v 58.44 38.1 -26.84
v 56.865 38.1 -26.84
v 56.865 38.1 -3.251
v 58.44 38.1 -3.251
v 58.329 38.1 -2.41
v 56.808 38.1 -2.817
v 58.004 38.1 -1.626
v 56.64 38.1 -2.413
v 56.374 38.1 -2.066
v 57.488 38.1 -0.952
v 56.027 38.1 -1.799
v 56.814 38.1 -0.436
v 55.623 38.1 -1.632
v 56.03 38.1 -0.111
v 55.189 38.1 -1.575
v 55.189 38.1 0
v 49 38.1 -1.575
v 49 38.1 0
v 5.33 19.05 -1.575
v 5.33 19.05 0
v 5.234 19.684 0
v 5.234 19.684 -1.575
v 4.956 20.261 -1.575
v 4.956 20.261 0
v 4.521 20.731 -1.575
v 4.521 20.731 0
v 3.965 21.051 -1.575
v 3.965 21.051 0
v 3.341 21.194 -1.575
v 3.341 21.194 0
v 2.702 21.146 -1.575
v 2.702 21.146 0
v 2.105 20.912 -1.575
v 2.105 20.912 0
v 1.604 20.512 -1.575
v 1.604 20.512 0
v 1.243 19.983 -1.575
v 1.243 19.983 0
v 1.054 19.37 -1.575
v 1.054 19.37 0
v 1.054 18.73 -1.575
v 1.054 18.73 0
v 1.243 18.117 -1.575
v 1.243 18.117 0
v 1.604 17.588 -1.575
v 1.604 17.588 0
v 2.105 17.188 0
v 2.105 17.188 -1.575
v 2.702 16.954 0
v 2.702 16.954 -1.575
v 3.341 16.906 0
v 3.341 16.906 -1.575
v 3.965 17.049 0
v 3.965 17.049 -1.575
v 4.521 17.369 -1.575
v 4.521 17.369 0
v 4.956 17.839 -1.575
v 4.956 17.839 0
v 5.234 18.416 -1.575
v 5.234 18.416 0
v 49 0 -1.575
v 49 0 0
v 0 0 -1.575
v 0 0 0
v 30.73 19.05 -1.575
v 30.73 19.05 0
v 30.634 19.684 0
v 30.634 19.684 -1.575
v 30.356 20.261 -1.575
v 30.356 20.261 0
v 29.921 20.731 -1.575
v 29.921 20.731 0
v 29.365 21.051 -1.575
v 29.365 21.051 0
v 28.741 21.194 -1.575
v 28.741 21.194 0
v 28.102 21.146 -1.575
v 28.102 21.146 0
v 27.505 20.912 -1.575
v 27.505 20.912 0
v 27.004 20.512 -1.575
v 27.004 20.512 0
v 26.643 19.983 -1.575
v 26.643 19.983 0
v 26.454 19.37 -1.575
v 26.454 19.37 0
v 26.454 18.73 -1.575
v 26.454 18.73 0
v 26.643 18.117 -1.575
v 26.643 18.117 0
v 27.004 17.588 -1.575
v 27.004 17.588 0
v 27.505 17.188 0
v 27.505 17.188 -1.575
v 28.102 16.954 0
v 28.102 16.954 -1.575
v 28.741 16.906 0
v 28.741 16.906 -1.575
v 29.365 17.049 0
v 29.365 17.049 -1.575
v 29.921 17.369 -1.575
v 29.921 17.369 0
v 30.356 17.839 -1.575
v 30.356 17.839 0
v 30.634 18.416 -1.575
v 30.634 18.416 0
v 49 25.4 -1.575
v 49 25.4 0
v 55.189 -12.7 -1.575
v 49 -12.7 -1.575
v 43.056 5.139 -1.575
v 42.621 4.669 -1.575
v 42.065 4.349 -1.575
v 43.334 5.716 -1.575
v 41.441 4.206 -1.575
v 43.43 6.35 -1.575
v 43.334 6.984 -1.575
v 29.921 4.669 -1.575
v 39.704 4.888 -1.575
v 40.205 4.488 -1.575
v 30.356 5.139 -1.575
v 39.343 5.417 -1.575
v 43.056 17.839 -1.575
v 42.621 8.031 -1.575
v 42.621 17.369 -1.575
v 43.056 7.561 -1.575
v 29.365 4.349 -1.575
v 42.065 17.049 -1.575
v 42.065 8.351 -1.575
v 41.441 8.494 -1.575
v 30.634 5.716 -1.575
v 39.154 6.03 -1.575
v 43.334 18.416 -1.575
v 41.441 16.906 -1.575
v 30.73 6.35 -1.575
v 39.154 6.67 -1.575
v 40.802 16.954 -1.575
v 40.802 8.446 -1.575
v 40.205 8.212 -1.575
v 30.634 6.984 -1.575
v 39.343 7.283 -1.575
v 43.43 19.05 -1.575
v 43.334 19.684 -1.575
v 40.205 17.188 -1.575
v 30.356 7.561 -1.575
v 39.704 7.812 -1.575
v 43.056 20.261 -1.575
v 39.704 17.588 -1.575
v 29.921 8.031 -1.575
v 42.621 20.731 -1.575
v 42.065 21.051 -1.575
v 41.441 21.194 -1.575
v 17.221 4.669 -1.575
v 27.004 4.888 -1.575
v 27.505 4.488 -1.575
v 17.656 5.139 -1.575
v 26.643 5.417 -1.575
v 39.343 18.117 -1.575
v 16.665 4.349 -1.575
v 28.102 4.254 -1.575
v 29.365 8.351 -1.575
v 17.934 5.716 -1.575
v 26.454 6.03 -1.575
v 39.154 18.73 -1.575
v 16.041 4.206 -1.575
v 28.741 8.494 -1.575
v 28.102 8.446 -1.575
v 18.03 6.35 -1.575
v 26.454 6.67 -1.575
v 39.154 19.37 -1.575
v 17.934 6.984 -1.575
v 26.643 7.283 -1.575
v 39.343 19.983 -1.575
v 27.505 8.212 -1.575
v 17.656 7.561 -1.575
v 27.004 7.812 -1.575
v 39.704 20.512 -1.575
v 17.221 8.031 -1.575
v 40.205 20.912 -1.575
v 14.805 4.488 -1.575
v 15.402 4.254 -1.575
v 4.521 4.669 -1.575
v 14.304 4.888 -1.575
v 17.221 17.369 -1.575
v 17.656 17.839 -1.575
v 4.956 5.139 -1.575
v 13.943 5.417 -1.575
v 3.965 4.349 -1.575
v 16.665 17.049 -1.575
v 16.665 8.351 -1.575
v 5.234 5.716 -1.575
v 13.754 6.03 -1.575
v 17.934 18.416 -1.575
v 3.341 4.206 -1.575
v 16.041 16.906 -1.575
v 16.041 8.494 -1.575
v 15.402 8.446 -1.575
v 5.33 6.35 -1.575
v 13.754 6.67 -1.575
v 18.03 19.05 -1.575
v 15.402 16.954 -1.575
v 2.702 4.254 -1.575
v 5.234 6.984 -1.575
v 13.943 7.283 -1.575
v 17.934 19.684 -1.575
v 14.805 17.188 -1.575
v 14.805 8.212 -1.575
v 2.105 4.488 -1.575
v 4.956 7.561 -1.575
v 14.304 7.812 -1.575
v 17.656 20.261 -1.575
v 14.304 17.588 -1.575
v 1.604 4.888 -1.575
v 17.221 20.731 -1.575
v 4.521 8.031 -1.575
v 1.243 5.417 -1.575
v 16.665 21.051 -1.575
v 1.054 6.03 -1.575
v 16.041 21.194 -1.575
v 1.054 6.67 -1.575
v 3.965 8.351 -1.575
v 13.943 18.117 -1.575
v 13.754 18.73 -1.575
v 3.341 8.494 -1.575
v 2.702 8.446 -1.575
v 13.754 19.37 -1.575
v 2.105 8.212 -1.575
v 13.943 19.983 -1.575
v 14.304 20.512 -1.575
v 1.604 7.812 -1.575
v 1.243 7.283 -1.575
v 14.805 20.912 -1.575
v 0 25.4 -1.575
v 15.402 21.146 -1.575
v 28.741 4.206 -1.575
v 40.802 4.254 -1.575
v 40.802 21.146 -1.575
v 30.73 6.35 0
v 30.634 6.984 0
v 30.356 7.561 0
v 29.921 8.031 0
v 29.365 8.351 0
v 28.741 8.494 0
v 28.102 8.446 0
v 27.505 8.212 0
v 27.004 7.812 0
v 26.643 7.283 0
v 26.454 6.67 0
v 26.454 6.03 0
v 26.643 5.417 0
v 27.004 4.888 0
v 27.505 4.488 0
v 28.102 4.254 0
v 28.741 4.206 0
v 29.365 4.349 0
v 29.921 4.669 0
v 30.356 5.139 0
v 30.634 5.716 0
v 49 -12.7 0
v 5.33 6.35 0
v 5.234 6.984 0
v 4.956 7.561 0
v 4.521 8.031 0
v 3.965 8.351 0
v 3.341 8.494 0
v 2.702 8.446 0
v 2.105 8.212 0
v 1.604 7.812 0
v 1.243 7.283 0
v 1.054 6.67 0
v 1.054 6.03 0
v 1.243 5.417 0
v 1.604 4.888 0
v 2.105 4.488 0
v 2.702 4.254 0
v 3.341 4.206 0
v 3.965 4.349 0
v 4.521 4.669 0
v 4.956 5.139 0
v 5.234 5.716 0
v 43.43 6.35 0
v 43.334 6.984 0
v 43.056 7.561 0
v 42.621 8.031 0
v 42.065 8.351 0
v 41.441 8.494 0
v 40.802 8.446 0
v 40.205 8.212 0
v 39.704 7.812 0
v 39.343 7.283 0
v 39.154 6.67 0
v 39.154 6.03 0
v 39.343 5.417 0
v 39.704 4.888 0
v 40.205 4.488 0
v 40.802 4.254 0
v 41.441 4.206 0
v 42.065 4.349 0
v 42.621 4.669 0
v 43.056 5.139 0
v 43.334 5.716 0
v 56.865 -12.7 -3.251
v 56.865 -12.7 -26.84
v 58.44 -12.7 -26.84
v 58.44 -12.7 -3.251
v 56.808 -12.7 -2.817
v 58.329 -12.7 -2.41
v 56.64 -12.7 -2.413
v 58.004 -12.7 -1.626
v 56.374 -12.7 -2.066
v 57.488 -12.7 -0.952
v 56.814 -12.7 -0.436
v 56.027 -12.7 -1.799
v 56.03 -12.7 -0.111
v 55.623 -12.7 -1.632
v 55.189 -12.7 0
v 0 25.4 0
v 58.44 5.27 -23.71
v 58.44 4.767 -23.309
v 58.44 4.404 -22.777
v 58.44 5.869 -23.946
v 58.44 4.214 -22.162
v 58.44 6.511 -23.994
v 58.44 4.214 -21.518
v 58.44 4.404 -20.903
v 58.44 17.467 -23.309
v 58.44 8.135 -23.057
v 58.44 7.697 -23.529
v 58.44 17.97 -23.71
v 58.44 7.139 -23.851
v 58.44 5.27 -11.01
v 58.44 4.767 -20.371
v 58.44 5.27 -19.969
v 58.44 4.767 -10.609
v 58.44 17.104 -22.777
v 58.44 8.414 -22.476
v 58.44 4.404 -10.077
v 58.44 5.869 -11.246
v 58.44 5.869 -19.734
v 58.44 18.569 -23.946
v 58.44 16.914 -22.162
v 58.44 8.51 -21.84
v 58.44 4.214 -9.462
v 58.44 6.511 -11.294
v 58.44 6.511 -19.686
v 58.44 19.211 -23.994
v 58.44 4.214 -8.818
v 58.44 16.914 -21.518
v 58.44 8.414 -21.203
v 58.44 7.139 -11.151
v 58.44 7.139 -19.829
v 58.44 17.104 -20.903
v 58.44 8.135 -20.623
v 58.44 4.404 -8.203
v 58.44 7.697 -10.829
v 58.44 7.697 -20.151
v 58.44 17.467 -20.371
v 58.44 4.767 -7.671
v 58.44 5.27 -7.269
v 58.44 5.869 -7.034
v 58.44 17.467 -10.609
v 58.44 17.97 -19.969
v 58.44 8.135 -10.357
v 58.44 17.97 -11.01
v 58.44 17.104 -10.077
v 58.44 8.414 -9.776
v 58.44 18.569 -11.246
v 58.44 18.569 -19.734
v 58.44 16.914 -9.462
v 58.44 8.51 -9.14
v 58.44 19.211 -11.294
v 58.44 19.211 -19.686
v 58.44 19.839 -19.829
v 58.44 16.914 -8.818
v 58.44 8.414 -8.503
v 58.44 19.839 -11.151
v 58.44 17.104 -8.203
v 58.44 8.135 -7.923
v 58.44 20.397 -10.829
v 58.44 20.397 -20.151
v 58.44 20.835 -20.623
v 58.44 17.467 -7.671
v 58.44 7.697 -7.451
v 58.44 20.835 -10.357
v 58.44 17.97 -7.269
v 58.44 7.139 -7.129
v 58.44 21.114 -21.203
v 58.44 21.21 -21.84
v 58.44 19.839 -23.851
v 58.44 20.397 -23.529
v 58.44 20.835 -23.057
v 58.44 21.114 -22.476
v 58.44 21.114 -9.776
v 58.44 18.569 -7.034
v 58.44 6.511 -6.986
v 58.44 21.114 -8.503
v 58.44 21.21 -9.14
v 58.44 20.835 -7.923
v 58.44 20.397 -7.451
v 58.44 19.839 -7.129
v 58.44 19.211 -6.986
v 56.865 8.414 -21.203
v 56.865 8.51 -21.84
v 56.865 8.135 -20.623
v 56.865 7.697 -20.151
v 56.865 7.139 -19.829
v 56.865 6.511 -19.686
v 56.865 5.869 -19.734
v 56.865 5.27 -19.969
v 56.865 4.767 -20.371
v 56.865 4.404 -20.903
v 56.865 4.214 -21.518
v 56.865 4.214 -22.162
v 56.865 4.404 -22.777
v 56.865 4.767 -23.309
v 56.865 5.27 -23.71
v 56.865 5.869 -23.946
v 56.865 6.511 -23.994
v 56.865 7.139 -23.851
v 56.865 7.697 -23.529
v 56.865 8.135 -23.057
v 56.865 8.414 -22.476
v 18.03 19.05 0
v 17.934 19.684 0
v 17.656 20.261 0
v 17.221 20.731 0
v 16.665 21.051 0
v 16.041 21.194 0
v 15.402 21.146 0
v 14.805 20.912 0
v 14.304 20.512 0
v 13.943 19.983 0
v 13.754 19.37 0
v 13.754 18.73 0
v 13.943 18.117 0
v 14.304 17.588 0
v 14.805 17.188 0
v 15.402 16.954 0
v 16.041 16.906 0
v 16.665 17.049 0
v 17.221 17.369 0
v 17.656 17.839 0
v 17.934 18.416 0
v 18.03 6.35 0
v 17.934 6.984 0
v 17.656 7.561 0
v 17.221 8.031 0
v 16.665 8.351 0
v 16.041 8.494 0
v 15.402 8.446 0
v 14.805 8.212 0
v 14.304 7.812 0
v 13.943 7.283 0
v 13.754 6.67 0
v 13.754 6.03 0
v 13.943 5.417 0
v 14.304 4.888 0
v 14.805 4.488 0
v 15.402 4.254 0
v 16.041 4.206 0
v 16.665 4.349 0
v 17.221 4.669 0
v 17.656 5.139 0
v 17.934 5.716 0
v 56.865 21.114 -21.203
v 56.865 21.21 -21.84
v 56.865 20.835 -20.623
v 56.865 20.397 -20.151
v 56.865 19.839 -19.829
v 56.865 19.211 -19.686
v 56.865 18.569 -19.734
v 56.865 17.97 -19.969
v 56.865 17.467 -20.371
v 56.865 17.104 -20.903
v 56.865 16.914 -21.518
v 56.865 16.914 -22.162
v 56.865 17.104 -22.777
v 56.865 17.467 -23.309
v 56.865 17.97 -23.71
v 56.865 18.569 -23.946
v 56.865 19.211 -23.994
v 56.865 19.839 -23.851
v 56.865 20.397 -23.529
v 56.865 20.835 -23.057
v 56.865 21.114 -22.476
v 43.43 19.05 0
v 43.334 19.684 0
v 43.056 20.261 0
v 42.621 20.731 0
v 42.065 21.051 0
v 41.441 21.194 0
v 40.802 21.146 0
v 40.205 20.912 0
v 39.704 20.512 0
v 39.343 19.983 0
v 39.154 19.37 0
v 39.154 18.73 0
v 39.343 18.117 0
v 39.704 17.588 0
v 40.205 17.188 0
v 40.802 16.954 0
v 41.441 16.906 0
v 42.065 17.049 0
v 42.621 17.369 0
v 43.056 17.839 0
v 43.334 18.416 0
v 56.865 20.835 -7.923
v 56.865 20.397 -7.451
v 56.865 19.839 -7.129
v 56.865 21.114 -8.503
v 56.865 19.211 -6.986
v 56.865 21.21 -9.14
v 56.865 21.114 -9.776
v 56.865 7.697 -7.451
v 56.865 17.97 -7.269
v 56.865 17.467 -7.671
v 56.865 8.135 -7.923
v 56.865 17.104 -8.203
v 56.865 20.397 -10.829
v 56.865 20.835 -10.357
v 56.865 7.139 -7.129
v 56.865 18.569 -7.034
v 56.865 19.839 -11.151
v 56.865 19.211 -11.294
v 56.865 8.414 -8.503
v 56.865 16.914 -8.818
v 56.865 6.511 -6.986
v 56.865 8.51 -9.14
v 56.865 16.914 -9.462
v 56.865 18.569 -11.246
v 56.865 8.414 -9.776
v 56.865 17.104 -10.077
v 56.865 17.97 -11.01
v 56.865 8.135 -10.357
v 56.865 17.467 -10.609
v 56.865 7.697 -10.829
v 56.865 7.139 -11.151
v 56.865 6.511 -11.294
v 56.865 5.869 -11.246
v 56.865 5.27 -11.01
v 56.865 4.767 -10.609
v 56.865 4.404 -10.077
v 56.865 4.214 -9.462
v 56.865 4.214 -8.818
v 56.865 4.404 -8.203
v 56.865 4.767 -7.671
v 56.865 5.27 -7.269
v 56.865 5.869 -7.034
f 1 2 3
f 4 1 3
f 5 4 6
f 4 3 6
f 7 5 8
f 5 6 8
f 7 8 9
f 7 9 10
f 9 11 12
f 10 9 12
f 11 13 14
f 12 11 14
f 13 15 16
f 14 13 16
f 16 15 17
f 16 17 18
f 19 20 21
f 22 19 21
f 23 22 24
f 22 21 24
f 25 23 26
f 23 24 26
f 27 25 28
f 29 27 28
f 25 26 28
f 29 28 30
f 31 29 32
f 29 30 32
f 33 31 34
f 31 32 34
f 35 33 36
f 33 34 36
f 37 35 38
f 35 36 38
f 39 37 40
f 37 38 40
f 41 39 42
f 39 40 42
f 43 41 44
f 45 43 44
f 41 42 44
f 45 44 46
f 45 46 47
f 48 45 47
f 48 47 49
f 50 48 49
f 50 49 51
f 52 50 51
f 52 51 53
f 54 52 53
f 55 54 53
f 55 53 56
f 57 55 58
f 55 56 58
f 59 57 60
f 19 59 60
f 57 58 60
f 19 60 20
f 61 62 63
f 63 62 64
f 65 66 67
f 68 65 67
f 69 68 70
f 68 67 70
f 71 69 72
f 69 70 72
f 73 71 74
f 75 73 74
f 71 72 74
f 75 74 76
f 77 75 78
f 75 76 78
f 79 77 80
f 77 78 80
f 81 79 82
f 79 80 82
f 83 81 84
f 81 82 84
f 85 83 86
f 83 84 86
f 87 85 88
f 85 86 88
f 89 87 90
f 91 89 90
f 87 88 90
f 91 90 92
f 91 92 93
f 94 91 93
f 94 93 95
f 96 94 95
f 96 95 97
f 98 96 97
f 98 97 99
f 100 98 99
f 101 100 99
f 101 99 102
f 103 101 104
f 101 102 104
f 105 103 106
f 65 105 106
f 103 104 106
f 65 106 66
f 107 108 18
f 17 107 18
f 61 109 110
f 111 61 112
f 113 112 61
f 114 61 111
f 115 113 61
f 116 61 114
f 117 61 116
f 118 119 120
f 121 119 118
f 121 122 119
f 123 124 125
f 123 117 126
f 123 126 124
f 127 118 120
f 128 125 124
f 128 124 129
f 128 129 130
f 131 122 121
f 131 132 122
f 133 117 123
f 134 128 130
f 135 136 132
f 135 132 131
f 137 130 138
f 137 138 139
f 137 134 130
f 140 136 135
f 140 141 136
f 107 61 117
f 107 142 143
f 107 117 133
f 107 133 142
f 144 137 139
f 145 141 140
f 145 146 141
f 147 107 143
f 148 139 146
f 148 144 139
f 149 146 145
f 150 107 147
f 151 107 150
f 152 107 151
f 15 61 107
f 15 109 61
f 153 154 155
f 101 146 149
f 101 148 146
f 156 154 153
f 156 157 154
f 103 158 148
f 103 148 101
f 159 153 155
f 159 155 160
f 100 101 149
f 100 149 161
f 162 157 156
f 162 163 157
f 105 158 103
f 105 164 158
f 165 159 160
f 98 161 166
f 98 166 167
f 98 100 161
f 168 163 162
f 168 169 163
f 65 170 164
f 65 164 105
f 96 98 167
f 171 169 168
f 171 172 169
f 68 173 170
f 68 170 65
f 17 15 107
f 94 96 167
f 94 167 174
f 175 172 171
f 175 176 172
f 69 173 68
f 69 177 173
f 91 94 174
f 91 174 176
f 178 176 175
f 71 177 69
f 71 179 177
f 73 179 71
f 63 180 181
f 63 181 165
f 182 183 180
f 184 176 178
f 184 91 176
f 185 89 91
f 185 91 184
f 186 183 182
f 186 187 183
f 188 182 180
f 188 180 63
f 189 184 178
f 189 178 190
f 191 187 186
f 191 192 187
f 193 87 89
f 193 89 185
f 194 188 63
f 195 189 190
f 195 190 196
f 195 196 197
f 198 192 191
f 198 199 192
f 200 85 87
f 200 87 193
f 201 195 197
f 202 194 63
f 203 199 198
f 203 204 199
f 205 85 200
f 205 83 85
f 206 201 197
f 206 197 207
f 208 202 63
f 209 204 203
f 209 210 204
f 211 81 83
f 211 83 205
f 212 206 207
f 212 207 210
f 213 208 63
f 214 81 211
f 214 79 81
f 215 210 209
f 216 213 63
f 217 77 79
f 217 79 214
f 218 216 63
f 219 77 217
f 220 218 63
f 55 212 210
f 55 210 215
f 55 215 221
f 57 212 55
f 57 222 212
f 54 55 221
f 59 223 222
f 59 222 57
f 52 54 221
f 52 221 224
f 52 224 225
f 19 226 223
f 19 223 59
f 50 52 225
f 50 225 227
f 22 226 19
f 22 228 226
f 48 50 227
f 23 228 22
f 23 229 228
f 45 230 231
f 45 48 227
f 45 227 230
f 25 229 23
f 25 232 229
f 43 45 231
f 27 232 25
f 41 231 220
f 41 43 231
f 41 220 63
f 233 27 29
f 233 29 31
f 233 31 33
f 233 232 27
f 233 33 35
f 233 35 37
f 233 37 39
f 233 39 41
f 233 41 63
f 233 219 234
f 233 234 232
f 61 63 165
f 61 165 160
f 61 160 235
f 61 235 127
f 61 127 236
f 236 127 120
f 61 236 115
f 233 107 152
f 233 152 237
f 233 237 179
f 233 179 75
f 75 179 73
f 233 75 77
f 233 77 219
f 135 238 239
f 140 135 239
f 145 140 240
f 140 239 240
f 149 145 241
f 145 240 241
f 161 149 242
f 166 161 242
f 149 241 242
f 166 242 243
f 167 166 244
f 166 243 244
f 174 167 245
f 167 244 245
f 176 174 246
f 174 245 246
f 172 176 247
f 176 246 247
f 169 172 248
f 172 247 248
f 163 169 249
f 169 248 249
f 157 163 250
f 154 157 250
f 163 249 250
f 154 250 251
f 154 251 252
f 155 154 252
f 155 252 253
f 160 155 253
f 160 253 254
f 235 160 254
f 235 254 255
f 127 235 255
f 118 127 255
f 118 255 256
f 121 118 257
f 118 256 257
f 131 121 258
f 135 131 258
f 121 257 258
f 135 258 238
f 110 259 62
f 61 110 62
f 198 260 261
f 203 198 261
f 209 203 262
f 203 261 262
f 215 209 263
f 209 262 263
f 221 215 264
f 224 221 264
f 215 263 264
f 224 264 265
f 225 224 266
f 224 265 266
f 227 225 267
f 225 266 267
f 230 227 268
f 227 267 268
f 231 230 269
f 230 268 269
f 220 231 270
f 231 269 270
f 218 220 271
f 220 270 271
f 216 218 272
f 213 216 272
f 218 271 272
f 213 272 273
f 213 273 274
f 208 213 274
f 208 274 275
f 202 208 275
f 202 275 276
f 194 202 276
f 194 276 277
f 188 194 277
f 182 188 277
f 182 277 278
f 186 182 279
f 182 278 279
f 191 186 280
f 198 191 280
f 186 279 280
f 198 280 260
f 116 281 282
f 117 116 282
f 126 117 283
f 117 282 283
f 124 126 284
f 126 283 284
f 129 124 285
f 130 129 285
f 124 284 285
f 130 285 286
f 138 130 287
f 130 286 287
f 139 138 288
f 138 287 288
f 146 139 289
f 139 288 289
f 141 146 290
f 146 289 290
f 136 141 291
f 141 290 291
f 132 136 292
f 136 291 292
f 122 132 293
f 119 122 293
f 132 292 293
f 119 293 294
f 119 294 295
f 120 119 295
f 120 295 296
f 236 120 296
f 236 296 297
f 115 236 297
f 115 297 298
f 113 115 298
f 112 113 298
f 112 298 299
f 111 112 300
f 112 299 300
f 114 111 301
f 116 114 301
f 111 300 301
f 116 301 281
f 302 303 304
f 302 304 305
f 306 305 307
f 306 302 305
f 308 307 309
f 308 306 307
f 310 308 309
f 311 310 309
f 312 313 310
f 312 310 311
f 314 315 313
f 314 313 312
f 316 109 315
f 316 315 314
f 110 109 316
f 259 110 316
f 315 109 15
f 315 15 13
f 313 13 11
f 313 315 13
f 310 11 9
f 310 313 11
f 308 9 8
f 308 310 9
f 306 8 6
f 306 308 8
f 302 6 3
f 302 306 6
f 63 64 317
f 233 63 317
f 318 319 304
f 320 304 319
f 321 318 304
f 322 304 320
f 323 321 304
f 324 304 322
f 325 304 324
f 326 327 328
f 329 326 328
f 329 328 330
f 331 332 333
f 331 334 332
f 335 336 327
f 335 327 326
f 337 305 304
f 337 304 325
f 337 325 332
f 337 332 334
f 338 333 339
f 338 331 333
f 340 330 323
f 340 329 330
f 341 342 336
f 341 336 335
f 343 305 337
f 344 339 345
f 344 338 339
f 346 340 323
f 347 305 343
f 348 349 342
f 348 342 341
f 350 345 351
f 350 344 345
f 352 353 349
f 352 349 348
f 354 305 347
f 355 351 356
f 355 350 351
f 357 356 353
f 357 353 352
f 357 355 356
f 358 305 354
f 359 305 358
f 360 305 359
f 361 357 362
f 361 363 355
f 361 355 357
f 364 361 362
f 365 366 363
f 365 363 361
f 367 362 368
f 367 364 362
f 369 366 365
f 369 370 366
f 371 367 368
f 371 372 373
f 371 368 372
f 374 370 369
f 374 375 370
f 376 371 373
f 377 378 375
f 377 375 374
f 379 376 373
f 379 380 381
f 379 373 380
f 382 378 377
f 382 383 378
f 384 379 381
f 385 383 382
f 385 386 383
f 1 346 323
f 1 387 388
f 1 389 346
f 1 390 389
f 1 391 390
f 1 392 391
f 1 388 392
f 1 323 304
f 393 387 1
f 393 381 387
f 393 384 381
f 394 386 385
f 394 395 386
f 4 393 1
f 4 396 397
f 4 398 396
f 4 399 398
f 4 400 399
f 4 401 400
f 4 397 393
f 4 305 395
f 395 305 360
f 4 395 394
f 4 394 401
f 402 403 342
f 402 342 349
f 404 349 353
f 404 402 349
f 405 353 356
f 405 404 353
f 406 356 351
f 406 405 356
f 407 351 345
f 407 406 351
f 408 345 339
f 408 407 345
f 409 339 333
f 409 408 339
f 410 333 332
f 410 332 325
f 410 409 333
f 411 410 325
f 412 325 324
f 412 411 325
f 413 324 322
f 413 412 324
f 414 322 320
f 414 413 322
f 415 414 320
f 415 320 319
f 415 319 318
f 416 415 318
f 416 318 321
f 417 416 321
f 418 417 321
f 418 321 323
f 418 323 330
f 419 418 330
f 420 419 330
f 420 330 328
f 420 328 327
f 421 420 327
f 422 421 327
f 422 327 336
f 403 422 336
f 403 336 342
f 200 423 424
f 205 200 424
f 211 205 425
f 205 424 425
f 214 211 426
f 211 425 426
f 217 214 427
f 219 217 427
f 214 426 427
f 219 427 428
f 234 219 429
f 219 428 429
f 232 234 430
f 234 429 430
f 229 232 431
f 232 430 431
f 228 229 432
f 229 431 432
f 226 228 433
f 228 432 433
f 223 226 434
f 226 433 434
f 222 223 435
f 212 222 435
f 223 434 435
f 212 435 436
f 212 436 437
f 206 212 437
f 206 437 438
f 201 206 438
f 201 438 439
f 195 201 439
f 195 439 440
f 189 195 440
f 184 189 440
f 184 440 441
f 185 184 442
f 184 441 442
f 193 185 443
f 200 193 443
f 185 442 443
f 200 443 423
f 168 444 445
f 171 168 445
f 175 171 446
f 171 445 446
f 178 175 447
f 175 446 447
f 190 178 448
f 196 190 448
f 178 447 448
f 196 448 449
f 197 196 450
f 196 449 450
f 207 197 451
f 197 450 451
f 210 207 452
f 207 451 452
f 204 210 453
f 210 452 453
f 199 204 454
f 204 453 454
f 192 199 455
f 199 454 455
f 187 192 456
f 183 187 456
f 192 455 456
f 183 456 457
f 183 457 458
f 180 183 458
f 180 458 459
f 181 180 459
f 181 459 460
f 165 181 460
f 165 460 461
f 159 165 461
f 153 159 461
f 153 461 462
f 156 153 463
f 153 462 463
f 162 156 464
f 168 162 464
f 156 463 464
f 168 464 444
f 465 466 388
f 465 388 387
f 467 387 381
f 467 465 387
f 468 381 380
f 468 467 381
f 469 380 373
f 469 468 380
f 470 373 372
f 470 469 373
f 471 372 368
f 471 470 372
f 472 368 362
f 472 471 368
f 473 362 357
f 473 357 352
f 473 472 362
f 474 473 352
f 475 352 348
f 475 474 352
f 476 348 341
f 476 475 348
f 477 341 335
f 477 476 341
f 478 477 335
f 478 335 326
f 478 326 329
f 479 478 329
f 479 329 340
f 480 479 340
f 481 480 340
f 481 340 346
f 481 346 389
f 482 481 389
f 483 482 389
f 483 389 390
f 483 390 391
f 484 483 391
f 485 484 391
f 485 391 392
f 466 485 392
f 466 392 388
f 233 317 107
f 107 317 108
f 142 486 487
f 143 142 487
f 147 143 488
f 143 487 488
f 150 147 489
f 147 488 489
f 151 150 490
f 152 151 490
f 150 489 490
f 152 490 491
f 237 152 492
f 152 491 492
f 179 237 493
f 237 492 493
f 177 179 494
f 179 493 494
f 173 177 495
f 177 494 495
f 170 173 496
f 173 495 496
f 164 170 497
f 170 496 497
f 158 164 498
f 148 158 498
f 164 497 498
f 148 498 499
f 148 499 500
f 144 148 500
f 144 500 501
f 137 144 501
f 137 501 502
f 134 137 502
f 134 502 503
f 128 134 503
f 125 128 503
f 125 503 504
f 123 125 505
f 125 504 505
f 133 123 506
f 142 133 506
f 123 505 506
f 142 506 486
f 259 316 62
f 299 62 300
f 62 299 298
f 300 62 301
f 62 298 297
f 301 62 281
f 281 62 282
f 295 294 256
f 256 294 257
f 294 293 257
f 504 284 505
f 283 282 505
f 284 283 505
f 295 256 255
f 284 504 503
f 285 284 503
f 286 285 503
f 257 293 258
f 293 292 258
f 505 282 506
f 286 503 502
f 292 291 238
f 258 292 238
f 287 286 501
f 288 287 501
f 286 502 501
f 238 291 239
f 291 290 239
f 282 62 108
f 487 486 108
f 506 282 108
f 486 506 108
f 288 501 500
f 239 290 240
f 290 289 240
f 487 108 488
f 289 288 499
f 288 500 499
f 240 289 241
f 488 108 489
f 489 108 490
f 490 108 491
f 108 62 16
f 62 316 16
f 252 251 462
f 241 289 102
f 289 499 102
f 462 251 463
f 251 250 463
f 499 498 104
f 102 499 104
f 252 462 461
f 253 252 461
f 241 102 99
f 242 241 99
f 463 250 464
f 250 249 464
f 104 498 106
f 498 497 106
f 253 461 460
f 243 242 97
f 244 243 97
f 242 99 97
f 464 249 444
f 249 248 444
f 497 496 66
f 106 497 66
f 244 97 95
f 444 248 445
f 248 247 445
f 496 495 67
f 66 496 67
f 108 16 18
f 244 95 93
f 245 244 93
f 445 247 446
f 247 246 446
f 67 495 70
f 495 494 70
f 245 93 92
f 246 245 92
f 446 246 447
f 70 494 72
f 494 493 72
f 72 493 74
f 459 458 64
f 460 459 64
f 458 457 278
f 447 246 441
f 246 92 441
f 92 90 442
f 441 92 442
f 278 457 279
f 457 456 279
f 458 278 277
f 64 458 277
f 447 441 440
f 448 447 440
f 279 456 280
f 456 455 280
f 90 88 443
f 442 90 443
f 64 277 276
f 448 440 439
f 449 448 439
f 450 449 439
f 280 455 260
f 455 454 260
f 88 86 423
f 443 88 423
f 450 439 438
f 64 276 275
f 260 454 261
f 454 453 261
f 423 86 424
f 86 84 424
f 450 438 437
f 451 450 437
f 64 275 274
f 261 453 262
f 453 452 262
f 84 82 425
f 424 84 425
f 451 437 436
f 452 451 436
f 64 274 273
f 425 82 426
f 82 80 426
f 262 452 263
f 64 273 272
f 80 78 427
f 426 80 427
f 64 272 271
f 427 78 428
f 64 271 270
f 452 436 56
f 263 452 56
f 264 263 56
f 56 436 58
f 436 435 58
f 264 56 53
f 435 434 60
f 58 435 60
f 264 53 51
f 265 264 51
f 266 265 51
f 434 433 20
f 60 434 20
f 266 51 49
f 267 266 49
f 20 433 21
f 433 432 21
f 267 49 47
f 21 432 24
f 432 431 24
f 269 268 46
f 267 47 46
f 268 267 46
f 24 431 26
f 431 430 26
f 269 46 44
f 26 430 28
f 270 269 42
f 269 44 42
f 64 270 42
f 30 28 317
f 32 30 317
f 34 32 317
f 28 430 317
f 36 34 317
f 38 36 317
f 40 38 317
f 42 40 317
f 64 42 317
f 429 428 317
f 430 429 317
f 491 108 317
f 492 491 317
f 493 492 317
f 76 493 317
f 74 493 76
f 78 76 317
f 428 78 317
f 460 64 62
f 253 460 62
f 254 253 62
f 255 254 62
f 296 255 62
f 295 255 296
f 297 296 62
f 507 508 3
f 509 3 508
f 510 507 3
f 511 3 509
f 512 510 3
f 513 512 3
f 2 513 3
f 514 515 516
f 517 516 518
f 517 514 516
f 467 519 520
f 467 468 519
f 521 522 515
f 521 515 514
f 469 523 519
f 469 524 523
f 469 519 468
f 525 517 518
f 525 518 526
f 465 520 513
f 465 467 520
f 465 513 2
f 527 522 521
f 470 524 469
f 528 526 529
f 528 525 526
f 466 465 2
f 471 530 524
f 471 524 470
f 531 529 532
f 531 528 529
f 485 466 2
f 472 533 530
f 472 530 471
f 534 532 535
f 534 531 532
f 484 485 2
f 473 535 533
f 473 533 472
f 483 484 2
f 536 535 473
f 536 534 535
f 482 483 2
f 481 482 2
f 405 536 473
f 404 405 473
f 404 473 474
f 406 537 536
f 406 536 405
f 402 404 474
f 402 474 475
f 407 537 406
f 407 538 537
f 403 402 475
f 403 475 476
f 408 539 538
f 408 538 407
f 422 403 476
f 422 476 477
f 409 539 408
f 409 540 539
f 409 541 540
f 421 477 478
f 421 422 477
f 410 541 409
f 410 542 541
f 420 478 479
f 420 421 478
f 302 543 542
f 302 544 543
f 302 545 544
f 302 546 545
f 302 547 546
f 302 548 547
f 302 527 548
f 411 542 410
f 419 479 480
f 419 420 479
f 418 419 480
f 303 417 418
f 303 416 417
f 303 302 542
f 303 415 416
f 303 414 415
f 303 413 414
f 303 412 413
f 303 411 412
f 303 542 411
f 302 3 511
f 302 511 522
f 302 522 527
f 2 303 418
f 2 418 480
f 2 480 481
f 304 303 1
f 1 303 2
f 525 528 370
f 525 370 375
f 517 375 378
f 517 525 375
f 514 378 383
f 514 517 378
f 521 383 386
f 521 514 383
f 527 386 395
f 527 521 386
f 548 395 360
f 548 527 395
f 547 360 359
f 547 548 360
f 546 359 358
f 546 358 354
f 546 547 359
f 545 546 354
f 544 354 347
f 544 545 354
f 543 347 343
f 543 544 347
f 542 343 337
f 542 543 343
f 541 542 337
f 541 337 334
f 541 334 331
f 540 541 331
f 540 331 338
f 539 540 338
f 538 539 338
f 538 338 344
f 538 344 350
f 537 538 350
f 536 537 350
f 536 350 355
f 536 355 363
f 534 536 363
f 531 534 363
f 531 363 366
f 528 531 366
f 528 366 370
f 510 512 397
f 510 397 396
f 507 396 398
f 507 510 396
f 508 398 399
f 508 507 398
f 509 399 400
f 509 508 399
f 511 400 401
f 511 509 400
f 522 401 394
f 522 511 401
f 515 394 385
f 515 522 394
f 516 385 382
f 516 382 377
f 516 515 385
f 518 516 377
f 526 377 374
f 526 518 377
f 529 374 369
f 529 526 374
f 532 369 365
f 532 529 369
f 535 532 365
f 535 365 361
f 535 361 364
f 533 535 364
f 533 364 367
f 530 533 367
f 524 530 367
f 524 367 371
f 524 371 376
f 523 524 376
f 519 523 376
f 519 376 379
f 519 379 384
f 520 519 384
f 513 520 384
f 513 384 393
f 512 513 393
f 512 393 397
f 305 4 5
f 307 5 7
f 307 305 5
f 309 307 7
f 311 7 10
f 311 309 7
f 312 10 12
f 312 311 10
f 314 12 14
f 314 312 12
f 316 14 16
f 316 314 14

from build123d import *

# Parameters (mm, degrees)
SKETCH1_R                  = 2.15
SKETCH1_R_2                = 2.16
BASE_FLANGE1_DEPTH         = 1.5748
SKETCHED_START             = 58.096428764
SKETCHED_BEND1_OUTLINE_W   = 50.8
SKETCHED_BEND1_OUTLINE_H   = 1.5748
SKETCHED_BEND1_DEPTH       = 24.303571236
SKETCHED_START_2           = 56.865020508
SKETCHED_BEND1_2_OUTLINE_W = 50.8
SKETCHED_BEND1_2_OUTLINE_H = 25.265020508
SKETCHED_BEND1_2_OUTLINE_R = 2.16
SKETCHED_BEND1_2_DEPTH     = 0.589203492
SKETCHED_START_3           = 55.188620508
SKETCHED_BEND1_3_OUTLINE_W = 50.8
SKETCHED_BEND1_3_OUTLINE_H = 25.265020508
SKETCHED_BEND1_3_OUTLINE_R = 2.16
SKETCHED_BEND1_3_DEPTH     = 3.2512
SKETCHED_START_4           = -12.7
SKETCHED_BEND1_4_DEPTH     = 50.8


with BuildPart() as part:
    # Base-Flange1: sheet metal written as solids
    # Sketch1 → Base-Flange1 (new body)
    with BuildSketch(Plane.XY):
        Polygon((49, 25.4), (49, 38.1), (57, 38.1), (82.4, 38.1), (82.4, -12.7), (57, -12.7), (49, -12.7), (49, 0), (0, 0), (0, 25.4), align=None)
        with Locations((3.18, 19.05)):
            Circle(SKETCH1_R, mode=Mode.SUBTRACT)
        with Locations((15.88, 19.05)):
            Circle(SKETCH1_R, mode=Mode.SUBTRACT)
        with Locations((28.58, 19.05)):
            Circle(SKETCH1_R, mode=Mode.SUBTRACT)
        with Locations((15.88, 6.35)):
            Circle(SKETCH1_R, mode=Mode.SUBTRACT)
        with Locations((28.58, 6.35)):
            Circle(SKETCH1_R, mode=Mode.SUBTRACT)
        with Locations((3.18, 6.35)):
            Circle(SKETCH1_R, mode=Mode.SUBTRACT)
        with Locations((41.28, 19.05)):
            Circle(SKETCH1_R, mode=Mode.SUBTRACT)
        with Locations((41.28, 6.35)):
            Circle(SKETCH1_R, mode=Mode.SUBTRACT)
        with Locations((64.7, 19.05)):
            Circle(SKETCH1_R_2, mode=Mode.SUBTRACT)
        with Locations((77.4, 19.05)):
            Circle(SKETCH1_R_2, mode=Mode.SUBTRACT)
        with Locations((64.7, 6.35)):
            Circle(SKETCH1_R_2, mode=Mode.SUBTRACT)
        with Locations((77.4, 6.35)):
            Circle(SKETCH1_R_2, mode=Mode.SUBTRACT)
    extrude(amount=-BASE_FLANGE1_DEPTH)

    # Sketched Bend1: read off the stored shape, not the designer's step
    # Sketched Bend1 outline → Sketched Bend1 (cut)
    with BuildSketch(Plane.YZ.offset(SKETCHED_START)):
        with Locations((12.7, -0.7874)):
            Rectangle(SKETCHED_BEND1_OUTLINE_W, SKETCHED_BEND1_OUTLINE_H)
    extrude(amount=SKETCHED_BEND1_DEPTH, mode=Mode.SUBTRACT)

    # Sketched Bend1 2 outline → Sketched Bend1 2 (add)
    with BuildSketch(Plane.YZ.offset(SKETCHED_START_2)):
        with Locations((12.7, -14.207310254)):
            Rectangle(SKETCHED_BEND1_2_OUTLINE_W, SKETCHED_BEND1_2_OUTLINE_H)
        with Locations((6.35, -21.839820508)):
            Circle(SKETCHED_BEND1_2_OUTLINE_R, mode=Mode.SUBTRACT)
        with Locations((19.05, -21.839820508)):
            Circle(SKETCHED_BEND1_2_OUTLINE_R, mode=Mode.SUBTRACT)
        with Locations((6.35, -9.139820508)):
            Circle(SKETCHED_BEND1_2_OUTLINE_R, mode=Mode.SUBTRACT)
        with Locations((19.05, -9.139820508)):
            Circle(SKETCHED_BEND1_2_OUTLINE_R, mode=Mode.SUBTRACT)
    extrude(amount=SKETCHED_BEND1_2_DEPTH)

    # Sketched Bend1 3 outline → Sketched Bend1 3 (add)
    with BuildSketch(Plane.YZ.offset(SKETCHED_START_3)):
        with Locations((12.7, -14.207310254)):
            Rectangle(SKETCHED_BEND1_3_OUTLINE_W, SKETCHED_BEND1_3_OUTLINE_H)
        with Locations((6.35, -21.839820508)):
            Circle(SKETCHED_BEND1_3_OUTLINE_R, mode=Mode.SUBTRACT)
        with Locations((19.05, -21.839820508)):
            Circle(SKETCHED_BEND1_3_OUTLINE_R, mode=Mode.SUBTRACT)
        with Locations((6.35, -9.139820508)):
            Circle(SKETCHED_BEND1_3_OUTLINE_R, mode=Mode.SUBTRACT)
        with Locations((19.05, -9.139820508)):
            Circle(SKETCHED_BEND1_3_OUTLINE_R, mode=Mode.SUBTRACT)
    extrude(amount=SKETCHED_BEND1_3_DEPTH)

    # Sketched Bend1 4 outline → Sketched Bend1 4 (cut)
    with BuildSketch(Plane(origin=(0, 0, 0), x_dir=(1, 0, 0), z_dir=(0, 1, 0)).offset(SKETCHED_START_4)):
        with BuildLine():
            Line((56.865020508, 3.2512), (56.865020508, 26.839820508))
            Line((56.865020508, 26.839820508), (55.188620508, 26.839820508))
            Line((55.188620508, 26.839820508), (55.188620508, 1.5748))
            ThreePointArc((55.188620508, 1.5748), (56.374014316, 2.065806192), (56.865020508, 3.2512))
        make_face()
        with BuildLine():
            Line((58.439820508, 1.5748), (58.439820508, 3.2512))
            ThreePointArc((58.439820508, 3.2512), (57.487566075, 0.952254433), (55.188620508, 0))
            Line((55.188620508, 0), (58.096428764, 0))
            Line((58.096428764, 0), (58.096428764, 1.5748))
            Line((58.096428764, 1.5748), (58.439820508, 1.5748))
        make_face()
    extrude(amount=SKETCHED_BEND1_4_DEPTH, mode=Mode.SUBTRACT)


solid = part.part
